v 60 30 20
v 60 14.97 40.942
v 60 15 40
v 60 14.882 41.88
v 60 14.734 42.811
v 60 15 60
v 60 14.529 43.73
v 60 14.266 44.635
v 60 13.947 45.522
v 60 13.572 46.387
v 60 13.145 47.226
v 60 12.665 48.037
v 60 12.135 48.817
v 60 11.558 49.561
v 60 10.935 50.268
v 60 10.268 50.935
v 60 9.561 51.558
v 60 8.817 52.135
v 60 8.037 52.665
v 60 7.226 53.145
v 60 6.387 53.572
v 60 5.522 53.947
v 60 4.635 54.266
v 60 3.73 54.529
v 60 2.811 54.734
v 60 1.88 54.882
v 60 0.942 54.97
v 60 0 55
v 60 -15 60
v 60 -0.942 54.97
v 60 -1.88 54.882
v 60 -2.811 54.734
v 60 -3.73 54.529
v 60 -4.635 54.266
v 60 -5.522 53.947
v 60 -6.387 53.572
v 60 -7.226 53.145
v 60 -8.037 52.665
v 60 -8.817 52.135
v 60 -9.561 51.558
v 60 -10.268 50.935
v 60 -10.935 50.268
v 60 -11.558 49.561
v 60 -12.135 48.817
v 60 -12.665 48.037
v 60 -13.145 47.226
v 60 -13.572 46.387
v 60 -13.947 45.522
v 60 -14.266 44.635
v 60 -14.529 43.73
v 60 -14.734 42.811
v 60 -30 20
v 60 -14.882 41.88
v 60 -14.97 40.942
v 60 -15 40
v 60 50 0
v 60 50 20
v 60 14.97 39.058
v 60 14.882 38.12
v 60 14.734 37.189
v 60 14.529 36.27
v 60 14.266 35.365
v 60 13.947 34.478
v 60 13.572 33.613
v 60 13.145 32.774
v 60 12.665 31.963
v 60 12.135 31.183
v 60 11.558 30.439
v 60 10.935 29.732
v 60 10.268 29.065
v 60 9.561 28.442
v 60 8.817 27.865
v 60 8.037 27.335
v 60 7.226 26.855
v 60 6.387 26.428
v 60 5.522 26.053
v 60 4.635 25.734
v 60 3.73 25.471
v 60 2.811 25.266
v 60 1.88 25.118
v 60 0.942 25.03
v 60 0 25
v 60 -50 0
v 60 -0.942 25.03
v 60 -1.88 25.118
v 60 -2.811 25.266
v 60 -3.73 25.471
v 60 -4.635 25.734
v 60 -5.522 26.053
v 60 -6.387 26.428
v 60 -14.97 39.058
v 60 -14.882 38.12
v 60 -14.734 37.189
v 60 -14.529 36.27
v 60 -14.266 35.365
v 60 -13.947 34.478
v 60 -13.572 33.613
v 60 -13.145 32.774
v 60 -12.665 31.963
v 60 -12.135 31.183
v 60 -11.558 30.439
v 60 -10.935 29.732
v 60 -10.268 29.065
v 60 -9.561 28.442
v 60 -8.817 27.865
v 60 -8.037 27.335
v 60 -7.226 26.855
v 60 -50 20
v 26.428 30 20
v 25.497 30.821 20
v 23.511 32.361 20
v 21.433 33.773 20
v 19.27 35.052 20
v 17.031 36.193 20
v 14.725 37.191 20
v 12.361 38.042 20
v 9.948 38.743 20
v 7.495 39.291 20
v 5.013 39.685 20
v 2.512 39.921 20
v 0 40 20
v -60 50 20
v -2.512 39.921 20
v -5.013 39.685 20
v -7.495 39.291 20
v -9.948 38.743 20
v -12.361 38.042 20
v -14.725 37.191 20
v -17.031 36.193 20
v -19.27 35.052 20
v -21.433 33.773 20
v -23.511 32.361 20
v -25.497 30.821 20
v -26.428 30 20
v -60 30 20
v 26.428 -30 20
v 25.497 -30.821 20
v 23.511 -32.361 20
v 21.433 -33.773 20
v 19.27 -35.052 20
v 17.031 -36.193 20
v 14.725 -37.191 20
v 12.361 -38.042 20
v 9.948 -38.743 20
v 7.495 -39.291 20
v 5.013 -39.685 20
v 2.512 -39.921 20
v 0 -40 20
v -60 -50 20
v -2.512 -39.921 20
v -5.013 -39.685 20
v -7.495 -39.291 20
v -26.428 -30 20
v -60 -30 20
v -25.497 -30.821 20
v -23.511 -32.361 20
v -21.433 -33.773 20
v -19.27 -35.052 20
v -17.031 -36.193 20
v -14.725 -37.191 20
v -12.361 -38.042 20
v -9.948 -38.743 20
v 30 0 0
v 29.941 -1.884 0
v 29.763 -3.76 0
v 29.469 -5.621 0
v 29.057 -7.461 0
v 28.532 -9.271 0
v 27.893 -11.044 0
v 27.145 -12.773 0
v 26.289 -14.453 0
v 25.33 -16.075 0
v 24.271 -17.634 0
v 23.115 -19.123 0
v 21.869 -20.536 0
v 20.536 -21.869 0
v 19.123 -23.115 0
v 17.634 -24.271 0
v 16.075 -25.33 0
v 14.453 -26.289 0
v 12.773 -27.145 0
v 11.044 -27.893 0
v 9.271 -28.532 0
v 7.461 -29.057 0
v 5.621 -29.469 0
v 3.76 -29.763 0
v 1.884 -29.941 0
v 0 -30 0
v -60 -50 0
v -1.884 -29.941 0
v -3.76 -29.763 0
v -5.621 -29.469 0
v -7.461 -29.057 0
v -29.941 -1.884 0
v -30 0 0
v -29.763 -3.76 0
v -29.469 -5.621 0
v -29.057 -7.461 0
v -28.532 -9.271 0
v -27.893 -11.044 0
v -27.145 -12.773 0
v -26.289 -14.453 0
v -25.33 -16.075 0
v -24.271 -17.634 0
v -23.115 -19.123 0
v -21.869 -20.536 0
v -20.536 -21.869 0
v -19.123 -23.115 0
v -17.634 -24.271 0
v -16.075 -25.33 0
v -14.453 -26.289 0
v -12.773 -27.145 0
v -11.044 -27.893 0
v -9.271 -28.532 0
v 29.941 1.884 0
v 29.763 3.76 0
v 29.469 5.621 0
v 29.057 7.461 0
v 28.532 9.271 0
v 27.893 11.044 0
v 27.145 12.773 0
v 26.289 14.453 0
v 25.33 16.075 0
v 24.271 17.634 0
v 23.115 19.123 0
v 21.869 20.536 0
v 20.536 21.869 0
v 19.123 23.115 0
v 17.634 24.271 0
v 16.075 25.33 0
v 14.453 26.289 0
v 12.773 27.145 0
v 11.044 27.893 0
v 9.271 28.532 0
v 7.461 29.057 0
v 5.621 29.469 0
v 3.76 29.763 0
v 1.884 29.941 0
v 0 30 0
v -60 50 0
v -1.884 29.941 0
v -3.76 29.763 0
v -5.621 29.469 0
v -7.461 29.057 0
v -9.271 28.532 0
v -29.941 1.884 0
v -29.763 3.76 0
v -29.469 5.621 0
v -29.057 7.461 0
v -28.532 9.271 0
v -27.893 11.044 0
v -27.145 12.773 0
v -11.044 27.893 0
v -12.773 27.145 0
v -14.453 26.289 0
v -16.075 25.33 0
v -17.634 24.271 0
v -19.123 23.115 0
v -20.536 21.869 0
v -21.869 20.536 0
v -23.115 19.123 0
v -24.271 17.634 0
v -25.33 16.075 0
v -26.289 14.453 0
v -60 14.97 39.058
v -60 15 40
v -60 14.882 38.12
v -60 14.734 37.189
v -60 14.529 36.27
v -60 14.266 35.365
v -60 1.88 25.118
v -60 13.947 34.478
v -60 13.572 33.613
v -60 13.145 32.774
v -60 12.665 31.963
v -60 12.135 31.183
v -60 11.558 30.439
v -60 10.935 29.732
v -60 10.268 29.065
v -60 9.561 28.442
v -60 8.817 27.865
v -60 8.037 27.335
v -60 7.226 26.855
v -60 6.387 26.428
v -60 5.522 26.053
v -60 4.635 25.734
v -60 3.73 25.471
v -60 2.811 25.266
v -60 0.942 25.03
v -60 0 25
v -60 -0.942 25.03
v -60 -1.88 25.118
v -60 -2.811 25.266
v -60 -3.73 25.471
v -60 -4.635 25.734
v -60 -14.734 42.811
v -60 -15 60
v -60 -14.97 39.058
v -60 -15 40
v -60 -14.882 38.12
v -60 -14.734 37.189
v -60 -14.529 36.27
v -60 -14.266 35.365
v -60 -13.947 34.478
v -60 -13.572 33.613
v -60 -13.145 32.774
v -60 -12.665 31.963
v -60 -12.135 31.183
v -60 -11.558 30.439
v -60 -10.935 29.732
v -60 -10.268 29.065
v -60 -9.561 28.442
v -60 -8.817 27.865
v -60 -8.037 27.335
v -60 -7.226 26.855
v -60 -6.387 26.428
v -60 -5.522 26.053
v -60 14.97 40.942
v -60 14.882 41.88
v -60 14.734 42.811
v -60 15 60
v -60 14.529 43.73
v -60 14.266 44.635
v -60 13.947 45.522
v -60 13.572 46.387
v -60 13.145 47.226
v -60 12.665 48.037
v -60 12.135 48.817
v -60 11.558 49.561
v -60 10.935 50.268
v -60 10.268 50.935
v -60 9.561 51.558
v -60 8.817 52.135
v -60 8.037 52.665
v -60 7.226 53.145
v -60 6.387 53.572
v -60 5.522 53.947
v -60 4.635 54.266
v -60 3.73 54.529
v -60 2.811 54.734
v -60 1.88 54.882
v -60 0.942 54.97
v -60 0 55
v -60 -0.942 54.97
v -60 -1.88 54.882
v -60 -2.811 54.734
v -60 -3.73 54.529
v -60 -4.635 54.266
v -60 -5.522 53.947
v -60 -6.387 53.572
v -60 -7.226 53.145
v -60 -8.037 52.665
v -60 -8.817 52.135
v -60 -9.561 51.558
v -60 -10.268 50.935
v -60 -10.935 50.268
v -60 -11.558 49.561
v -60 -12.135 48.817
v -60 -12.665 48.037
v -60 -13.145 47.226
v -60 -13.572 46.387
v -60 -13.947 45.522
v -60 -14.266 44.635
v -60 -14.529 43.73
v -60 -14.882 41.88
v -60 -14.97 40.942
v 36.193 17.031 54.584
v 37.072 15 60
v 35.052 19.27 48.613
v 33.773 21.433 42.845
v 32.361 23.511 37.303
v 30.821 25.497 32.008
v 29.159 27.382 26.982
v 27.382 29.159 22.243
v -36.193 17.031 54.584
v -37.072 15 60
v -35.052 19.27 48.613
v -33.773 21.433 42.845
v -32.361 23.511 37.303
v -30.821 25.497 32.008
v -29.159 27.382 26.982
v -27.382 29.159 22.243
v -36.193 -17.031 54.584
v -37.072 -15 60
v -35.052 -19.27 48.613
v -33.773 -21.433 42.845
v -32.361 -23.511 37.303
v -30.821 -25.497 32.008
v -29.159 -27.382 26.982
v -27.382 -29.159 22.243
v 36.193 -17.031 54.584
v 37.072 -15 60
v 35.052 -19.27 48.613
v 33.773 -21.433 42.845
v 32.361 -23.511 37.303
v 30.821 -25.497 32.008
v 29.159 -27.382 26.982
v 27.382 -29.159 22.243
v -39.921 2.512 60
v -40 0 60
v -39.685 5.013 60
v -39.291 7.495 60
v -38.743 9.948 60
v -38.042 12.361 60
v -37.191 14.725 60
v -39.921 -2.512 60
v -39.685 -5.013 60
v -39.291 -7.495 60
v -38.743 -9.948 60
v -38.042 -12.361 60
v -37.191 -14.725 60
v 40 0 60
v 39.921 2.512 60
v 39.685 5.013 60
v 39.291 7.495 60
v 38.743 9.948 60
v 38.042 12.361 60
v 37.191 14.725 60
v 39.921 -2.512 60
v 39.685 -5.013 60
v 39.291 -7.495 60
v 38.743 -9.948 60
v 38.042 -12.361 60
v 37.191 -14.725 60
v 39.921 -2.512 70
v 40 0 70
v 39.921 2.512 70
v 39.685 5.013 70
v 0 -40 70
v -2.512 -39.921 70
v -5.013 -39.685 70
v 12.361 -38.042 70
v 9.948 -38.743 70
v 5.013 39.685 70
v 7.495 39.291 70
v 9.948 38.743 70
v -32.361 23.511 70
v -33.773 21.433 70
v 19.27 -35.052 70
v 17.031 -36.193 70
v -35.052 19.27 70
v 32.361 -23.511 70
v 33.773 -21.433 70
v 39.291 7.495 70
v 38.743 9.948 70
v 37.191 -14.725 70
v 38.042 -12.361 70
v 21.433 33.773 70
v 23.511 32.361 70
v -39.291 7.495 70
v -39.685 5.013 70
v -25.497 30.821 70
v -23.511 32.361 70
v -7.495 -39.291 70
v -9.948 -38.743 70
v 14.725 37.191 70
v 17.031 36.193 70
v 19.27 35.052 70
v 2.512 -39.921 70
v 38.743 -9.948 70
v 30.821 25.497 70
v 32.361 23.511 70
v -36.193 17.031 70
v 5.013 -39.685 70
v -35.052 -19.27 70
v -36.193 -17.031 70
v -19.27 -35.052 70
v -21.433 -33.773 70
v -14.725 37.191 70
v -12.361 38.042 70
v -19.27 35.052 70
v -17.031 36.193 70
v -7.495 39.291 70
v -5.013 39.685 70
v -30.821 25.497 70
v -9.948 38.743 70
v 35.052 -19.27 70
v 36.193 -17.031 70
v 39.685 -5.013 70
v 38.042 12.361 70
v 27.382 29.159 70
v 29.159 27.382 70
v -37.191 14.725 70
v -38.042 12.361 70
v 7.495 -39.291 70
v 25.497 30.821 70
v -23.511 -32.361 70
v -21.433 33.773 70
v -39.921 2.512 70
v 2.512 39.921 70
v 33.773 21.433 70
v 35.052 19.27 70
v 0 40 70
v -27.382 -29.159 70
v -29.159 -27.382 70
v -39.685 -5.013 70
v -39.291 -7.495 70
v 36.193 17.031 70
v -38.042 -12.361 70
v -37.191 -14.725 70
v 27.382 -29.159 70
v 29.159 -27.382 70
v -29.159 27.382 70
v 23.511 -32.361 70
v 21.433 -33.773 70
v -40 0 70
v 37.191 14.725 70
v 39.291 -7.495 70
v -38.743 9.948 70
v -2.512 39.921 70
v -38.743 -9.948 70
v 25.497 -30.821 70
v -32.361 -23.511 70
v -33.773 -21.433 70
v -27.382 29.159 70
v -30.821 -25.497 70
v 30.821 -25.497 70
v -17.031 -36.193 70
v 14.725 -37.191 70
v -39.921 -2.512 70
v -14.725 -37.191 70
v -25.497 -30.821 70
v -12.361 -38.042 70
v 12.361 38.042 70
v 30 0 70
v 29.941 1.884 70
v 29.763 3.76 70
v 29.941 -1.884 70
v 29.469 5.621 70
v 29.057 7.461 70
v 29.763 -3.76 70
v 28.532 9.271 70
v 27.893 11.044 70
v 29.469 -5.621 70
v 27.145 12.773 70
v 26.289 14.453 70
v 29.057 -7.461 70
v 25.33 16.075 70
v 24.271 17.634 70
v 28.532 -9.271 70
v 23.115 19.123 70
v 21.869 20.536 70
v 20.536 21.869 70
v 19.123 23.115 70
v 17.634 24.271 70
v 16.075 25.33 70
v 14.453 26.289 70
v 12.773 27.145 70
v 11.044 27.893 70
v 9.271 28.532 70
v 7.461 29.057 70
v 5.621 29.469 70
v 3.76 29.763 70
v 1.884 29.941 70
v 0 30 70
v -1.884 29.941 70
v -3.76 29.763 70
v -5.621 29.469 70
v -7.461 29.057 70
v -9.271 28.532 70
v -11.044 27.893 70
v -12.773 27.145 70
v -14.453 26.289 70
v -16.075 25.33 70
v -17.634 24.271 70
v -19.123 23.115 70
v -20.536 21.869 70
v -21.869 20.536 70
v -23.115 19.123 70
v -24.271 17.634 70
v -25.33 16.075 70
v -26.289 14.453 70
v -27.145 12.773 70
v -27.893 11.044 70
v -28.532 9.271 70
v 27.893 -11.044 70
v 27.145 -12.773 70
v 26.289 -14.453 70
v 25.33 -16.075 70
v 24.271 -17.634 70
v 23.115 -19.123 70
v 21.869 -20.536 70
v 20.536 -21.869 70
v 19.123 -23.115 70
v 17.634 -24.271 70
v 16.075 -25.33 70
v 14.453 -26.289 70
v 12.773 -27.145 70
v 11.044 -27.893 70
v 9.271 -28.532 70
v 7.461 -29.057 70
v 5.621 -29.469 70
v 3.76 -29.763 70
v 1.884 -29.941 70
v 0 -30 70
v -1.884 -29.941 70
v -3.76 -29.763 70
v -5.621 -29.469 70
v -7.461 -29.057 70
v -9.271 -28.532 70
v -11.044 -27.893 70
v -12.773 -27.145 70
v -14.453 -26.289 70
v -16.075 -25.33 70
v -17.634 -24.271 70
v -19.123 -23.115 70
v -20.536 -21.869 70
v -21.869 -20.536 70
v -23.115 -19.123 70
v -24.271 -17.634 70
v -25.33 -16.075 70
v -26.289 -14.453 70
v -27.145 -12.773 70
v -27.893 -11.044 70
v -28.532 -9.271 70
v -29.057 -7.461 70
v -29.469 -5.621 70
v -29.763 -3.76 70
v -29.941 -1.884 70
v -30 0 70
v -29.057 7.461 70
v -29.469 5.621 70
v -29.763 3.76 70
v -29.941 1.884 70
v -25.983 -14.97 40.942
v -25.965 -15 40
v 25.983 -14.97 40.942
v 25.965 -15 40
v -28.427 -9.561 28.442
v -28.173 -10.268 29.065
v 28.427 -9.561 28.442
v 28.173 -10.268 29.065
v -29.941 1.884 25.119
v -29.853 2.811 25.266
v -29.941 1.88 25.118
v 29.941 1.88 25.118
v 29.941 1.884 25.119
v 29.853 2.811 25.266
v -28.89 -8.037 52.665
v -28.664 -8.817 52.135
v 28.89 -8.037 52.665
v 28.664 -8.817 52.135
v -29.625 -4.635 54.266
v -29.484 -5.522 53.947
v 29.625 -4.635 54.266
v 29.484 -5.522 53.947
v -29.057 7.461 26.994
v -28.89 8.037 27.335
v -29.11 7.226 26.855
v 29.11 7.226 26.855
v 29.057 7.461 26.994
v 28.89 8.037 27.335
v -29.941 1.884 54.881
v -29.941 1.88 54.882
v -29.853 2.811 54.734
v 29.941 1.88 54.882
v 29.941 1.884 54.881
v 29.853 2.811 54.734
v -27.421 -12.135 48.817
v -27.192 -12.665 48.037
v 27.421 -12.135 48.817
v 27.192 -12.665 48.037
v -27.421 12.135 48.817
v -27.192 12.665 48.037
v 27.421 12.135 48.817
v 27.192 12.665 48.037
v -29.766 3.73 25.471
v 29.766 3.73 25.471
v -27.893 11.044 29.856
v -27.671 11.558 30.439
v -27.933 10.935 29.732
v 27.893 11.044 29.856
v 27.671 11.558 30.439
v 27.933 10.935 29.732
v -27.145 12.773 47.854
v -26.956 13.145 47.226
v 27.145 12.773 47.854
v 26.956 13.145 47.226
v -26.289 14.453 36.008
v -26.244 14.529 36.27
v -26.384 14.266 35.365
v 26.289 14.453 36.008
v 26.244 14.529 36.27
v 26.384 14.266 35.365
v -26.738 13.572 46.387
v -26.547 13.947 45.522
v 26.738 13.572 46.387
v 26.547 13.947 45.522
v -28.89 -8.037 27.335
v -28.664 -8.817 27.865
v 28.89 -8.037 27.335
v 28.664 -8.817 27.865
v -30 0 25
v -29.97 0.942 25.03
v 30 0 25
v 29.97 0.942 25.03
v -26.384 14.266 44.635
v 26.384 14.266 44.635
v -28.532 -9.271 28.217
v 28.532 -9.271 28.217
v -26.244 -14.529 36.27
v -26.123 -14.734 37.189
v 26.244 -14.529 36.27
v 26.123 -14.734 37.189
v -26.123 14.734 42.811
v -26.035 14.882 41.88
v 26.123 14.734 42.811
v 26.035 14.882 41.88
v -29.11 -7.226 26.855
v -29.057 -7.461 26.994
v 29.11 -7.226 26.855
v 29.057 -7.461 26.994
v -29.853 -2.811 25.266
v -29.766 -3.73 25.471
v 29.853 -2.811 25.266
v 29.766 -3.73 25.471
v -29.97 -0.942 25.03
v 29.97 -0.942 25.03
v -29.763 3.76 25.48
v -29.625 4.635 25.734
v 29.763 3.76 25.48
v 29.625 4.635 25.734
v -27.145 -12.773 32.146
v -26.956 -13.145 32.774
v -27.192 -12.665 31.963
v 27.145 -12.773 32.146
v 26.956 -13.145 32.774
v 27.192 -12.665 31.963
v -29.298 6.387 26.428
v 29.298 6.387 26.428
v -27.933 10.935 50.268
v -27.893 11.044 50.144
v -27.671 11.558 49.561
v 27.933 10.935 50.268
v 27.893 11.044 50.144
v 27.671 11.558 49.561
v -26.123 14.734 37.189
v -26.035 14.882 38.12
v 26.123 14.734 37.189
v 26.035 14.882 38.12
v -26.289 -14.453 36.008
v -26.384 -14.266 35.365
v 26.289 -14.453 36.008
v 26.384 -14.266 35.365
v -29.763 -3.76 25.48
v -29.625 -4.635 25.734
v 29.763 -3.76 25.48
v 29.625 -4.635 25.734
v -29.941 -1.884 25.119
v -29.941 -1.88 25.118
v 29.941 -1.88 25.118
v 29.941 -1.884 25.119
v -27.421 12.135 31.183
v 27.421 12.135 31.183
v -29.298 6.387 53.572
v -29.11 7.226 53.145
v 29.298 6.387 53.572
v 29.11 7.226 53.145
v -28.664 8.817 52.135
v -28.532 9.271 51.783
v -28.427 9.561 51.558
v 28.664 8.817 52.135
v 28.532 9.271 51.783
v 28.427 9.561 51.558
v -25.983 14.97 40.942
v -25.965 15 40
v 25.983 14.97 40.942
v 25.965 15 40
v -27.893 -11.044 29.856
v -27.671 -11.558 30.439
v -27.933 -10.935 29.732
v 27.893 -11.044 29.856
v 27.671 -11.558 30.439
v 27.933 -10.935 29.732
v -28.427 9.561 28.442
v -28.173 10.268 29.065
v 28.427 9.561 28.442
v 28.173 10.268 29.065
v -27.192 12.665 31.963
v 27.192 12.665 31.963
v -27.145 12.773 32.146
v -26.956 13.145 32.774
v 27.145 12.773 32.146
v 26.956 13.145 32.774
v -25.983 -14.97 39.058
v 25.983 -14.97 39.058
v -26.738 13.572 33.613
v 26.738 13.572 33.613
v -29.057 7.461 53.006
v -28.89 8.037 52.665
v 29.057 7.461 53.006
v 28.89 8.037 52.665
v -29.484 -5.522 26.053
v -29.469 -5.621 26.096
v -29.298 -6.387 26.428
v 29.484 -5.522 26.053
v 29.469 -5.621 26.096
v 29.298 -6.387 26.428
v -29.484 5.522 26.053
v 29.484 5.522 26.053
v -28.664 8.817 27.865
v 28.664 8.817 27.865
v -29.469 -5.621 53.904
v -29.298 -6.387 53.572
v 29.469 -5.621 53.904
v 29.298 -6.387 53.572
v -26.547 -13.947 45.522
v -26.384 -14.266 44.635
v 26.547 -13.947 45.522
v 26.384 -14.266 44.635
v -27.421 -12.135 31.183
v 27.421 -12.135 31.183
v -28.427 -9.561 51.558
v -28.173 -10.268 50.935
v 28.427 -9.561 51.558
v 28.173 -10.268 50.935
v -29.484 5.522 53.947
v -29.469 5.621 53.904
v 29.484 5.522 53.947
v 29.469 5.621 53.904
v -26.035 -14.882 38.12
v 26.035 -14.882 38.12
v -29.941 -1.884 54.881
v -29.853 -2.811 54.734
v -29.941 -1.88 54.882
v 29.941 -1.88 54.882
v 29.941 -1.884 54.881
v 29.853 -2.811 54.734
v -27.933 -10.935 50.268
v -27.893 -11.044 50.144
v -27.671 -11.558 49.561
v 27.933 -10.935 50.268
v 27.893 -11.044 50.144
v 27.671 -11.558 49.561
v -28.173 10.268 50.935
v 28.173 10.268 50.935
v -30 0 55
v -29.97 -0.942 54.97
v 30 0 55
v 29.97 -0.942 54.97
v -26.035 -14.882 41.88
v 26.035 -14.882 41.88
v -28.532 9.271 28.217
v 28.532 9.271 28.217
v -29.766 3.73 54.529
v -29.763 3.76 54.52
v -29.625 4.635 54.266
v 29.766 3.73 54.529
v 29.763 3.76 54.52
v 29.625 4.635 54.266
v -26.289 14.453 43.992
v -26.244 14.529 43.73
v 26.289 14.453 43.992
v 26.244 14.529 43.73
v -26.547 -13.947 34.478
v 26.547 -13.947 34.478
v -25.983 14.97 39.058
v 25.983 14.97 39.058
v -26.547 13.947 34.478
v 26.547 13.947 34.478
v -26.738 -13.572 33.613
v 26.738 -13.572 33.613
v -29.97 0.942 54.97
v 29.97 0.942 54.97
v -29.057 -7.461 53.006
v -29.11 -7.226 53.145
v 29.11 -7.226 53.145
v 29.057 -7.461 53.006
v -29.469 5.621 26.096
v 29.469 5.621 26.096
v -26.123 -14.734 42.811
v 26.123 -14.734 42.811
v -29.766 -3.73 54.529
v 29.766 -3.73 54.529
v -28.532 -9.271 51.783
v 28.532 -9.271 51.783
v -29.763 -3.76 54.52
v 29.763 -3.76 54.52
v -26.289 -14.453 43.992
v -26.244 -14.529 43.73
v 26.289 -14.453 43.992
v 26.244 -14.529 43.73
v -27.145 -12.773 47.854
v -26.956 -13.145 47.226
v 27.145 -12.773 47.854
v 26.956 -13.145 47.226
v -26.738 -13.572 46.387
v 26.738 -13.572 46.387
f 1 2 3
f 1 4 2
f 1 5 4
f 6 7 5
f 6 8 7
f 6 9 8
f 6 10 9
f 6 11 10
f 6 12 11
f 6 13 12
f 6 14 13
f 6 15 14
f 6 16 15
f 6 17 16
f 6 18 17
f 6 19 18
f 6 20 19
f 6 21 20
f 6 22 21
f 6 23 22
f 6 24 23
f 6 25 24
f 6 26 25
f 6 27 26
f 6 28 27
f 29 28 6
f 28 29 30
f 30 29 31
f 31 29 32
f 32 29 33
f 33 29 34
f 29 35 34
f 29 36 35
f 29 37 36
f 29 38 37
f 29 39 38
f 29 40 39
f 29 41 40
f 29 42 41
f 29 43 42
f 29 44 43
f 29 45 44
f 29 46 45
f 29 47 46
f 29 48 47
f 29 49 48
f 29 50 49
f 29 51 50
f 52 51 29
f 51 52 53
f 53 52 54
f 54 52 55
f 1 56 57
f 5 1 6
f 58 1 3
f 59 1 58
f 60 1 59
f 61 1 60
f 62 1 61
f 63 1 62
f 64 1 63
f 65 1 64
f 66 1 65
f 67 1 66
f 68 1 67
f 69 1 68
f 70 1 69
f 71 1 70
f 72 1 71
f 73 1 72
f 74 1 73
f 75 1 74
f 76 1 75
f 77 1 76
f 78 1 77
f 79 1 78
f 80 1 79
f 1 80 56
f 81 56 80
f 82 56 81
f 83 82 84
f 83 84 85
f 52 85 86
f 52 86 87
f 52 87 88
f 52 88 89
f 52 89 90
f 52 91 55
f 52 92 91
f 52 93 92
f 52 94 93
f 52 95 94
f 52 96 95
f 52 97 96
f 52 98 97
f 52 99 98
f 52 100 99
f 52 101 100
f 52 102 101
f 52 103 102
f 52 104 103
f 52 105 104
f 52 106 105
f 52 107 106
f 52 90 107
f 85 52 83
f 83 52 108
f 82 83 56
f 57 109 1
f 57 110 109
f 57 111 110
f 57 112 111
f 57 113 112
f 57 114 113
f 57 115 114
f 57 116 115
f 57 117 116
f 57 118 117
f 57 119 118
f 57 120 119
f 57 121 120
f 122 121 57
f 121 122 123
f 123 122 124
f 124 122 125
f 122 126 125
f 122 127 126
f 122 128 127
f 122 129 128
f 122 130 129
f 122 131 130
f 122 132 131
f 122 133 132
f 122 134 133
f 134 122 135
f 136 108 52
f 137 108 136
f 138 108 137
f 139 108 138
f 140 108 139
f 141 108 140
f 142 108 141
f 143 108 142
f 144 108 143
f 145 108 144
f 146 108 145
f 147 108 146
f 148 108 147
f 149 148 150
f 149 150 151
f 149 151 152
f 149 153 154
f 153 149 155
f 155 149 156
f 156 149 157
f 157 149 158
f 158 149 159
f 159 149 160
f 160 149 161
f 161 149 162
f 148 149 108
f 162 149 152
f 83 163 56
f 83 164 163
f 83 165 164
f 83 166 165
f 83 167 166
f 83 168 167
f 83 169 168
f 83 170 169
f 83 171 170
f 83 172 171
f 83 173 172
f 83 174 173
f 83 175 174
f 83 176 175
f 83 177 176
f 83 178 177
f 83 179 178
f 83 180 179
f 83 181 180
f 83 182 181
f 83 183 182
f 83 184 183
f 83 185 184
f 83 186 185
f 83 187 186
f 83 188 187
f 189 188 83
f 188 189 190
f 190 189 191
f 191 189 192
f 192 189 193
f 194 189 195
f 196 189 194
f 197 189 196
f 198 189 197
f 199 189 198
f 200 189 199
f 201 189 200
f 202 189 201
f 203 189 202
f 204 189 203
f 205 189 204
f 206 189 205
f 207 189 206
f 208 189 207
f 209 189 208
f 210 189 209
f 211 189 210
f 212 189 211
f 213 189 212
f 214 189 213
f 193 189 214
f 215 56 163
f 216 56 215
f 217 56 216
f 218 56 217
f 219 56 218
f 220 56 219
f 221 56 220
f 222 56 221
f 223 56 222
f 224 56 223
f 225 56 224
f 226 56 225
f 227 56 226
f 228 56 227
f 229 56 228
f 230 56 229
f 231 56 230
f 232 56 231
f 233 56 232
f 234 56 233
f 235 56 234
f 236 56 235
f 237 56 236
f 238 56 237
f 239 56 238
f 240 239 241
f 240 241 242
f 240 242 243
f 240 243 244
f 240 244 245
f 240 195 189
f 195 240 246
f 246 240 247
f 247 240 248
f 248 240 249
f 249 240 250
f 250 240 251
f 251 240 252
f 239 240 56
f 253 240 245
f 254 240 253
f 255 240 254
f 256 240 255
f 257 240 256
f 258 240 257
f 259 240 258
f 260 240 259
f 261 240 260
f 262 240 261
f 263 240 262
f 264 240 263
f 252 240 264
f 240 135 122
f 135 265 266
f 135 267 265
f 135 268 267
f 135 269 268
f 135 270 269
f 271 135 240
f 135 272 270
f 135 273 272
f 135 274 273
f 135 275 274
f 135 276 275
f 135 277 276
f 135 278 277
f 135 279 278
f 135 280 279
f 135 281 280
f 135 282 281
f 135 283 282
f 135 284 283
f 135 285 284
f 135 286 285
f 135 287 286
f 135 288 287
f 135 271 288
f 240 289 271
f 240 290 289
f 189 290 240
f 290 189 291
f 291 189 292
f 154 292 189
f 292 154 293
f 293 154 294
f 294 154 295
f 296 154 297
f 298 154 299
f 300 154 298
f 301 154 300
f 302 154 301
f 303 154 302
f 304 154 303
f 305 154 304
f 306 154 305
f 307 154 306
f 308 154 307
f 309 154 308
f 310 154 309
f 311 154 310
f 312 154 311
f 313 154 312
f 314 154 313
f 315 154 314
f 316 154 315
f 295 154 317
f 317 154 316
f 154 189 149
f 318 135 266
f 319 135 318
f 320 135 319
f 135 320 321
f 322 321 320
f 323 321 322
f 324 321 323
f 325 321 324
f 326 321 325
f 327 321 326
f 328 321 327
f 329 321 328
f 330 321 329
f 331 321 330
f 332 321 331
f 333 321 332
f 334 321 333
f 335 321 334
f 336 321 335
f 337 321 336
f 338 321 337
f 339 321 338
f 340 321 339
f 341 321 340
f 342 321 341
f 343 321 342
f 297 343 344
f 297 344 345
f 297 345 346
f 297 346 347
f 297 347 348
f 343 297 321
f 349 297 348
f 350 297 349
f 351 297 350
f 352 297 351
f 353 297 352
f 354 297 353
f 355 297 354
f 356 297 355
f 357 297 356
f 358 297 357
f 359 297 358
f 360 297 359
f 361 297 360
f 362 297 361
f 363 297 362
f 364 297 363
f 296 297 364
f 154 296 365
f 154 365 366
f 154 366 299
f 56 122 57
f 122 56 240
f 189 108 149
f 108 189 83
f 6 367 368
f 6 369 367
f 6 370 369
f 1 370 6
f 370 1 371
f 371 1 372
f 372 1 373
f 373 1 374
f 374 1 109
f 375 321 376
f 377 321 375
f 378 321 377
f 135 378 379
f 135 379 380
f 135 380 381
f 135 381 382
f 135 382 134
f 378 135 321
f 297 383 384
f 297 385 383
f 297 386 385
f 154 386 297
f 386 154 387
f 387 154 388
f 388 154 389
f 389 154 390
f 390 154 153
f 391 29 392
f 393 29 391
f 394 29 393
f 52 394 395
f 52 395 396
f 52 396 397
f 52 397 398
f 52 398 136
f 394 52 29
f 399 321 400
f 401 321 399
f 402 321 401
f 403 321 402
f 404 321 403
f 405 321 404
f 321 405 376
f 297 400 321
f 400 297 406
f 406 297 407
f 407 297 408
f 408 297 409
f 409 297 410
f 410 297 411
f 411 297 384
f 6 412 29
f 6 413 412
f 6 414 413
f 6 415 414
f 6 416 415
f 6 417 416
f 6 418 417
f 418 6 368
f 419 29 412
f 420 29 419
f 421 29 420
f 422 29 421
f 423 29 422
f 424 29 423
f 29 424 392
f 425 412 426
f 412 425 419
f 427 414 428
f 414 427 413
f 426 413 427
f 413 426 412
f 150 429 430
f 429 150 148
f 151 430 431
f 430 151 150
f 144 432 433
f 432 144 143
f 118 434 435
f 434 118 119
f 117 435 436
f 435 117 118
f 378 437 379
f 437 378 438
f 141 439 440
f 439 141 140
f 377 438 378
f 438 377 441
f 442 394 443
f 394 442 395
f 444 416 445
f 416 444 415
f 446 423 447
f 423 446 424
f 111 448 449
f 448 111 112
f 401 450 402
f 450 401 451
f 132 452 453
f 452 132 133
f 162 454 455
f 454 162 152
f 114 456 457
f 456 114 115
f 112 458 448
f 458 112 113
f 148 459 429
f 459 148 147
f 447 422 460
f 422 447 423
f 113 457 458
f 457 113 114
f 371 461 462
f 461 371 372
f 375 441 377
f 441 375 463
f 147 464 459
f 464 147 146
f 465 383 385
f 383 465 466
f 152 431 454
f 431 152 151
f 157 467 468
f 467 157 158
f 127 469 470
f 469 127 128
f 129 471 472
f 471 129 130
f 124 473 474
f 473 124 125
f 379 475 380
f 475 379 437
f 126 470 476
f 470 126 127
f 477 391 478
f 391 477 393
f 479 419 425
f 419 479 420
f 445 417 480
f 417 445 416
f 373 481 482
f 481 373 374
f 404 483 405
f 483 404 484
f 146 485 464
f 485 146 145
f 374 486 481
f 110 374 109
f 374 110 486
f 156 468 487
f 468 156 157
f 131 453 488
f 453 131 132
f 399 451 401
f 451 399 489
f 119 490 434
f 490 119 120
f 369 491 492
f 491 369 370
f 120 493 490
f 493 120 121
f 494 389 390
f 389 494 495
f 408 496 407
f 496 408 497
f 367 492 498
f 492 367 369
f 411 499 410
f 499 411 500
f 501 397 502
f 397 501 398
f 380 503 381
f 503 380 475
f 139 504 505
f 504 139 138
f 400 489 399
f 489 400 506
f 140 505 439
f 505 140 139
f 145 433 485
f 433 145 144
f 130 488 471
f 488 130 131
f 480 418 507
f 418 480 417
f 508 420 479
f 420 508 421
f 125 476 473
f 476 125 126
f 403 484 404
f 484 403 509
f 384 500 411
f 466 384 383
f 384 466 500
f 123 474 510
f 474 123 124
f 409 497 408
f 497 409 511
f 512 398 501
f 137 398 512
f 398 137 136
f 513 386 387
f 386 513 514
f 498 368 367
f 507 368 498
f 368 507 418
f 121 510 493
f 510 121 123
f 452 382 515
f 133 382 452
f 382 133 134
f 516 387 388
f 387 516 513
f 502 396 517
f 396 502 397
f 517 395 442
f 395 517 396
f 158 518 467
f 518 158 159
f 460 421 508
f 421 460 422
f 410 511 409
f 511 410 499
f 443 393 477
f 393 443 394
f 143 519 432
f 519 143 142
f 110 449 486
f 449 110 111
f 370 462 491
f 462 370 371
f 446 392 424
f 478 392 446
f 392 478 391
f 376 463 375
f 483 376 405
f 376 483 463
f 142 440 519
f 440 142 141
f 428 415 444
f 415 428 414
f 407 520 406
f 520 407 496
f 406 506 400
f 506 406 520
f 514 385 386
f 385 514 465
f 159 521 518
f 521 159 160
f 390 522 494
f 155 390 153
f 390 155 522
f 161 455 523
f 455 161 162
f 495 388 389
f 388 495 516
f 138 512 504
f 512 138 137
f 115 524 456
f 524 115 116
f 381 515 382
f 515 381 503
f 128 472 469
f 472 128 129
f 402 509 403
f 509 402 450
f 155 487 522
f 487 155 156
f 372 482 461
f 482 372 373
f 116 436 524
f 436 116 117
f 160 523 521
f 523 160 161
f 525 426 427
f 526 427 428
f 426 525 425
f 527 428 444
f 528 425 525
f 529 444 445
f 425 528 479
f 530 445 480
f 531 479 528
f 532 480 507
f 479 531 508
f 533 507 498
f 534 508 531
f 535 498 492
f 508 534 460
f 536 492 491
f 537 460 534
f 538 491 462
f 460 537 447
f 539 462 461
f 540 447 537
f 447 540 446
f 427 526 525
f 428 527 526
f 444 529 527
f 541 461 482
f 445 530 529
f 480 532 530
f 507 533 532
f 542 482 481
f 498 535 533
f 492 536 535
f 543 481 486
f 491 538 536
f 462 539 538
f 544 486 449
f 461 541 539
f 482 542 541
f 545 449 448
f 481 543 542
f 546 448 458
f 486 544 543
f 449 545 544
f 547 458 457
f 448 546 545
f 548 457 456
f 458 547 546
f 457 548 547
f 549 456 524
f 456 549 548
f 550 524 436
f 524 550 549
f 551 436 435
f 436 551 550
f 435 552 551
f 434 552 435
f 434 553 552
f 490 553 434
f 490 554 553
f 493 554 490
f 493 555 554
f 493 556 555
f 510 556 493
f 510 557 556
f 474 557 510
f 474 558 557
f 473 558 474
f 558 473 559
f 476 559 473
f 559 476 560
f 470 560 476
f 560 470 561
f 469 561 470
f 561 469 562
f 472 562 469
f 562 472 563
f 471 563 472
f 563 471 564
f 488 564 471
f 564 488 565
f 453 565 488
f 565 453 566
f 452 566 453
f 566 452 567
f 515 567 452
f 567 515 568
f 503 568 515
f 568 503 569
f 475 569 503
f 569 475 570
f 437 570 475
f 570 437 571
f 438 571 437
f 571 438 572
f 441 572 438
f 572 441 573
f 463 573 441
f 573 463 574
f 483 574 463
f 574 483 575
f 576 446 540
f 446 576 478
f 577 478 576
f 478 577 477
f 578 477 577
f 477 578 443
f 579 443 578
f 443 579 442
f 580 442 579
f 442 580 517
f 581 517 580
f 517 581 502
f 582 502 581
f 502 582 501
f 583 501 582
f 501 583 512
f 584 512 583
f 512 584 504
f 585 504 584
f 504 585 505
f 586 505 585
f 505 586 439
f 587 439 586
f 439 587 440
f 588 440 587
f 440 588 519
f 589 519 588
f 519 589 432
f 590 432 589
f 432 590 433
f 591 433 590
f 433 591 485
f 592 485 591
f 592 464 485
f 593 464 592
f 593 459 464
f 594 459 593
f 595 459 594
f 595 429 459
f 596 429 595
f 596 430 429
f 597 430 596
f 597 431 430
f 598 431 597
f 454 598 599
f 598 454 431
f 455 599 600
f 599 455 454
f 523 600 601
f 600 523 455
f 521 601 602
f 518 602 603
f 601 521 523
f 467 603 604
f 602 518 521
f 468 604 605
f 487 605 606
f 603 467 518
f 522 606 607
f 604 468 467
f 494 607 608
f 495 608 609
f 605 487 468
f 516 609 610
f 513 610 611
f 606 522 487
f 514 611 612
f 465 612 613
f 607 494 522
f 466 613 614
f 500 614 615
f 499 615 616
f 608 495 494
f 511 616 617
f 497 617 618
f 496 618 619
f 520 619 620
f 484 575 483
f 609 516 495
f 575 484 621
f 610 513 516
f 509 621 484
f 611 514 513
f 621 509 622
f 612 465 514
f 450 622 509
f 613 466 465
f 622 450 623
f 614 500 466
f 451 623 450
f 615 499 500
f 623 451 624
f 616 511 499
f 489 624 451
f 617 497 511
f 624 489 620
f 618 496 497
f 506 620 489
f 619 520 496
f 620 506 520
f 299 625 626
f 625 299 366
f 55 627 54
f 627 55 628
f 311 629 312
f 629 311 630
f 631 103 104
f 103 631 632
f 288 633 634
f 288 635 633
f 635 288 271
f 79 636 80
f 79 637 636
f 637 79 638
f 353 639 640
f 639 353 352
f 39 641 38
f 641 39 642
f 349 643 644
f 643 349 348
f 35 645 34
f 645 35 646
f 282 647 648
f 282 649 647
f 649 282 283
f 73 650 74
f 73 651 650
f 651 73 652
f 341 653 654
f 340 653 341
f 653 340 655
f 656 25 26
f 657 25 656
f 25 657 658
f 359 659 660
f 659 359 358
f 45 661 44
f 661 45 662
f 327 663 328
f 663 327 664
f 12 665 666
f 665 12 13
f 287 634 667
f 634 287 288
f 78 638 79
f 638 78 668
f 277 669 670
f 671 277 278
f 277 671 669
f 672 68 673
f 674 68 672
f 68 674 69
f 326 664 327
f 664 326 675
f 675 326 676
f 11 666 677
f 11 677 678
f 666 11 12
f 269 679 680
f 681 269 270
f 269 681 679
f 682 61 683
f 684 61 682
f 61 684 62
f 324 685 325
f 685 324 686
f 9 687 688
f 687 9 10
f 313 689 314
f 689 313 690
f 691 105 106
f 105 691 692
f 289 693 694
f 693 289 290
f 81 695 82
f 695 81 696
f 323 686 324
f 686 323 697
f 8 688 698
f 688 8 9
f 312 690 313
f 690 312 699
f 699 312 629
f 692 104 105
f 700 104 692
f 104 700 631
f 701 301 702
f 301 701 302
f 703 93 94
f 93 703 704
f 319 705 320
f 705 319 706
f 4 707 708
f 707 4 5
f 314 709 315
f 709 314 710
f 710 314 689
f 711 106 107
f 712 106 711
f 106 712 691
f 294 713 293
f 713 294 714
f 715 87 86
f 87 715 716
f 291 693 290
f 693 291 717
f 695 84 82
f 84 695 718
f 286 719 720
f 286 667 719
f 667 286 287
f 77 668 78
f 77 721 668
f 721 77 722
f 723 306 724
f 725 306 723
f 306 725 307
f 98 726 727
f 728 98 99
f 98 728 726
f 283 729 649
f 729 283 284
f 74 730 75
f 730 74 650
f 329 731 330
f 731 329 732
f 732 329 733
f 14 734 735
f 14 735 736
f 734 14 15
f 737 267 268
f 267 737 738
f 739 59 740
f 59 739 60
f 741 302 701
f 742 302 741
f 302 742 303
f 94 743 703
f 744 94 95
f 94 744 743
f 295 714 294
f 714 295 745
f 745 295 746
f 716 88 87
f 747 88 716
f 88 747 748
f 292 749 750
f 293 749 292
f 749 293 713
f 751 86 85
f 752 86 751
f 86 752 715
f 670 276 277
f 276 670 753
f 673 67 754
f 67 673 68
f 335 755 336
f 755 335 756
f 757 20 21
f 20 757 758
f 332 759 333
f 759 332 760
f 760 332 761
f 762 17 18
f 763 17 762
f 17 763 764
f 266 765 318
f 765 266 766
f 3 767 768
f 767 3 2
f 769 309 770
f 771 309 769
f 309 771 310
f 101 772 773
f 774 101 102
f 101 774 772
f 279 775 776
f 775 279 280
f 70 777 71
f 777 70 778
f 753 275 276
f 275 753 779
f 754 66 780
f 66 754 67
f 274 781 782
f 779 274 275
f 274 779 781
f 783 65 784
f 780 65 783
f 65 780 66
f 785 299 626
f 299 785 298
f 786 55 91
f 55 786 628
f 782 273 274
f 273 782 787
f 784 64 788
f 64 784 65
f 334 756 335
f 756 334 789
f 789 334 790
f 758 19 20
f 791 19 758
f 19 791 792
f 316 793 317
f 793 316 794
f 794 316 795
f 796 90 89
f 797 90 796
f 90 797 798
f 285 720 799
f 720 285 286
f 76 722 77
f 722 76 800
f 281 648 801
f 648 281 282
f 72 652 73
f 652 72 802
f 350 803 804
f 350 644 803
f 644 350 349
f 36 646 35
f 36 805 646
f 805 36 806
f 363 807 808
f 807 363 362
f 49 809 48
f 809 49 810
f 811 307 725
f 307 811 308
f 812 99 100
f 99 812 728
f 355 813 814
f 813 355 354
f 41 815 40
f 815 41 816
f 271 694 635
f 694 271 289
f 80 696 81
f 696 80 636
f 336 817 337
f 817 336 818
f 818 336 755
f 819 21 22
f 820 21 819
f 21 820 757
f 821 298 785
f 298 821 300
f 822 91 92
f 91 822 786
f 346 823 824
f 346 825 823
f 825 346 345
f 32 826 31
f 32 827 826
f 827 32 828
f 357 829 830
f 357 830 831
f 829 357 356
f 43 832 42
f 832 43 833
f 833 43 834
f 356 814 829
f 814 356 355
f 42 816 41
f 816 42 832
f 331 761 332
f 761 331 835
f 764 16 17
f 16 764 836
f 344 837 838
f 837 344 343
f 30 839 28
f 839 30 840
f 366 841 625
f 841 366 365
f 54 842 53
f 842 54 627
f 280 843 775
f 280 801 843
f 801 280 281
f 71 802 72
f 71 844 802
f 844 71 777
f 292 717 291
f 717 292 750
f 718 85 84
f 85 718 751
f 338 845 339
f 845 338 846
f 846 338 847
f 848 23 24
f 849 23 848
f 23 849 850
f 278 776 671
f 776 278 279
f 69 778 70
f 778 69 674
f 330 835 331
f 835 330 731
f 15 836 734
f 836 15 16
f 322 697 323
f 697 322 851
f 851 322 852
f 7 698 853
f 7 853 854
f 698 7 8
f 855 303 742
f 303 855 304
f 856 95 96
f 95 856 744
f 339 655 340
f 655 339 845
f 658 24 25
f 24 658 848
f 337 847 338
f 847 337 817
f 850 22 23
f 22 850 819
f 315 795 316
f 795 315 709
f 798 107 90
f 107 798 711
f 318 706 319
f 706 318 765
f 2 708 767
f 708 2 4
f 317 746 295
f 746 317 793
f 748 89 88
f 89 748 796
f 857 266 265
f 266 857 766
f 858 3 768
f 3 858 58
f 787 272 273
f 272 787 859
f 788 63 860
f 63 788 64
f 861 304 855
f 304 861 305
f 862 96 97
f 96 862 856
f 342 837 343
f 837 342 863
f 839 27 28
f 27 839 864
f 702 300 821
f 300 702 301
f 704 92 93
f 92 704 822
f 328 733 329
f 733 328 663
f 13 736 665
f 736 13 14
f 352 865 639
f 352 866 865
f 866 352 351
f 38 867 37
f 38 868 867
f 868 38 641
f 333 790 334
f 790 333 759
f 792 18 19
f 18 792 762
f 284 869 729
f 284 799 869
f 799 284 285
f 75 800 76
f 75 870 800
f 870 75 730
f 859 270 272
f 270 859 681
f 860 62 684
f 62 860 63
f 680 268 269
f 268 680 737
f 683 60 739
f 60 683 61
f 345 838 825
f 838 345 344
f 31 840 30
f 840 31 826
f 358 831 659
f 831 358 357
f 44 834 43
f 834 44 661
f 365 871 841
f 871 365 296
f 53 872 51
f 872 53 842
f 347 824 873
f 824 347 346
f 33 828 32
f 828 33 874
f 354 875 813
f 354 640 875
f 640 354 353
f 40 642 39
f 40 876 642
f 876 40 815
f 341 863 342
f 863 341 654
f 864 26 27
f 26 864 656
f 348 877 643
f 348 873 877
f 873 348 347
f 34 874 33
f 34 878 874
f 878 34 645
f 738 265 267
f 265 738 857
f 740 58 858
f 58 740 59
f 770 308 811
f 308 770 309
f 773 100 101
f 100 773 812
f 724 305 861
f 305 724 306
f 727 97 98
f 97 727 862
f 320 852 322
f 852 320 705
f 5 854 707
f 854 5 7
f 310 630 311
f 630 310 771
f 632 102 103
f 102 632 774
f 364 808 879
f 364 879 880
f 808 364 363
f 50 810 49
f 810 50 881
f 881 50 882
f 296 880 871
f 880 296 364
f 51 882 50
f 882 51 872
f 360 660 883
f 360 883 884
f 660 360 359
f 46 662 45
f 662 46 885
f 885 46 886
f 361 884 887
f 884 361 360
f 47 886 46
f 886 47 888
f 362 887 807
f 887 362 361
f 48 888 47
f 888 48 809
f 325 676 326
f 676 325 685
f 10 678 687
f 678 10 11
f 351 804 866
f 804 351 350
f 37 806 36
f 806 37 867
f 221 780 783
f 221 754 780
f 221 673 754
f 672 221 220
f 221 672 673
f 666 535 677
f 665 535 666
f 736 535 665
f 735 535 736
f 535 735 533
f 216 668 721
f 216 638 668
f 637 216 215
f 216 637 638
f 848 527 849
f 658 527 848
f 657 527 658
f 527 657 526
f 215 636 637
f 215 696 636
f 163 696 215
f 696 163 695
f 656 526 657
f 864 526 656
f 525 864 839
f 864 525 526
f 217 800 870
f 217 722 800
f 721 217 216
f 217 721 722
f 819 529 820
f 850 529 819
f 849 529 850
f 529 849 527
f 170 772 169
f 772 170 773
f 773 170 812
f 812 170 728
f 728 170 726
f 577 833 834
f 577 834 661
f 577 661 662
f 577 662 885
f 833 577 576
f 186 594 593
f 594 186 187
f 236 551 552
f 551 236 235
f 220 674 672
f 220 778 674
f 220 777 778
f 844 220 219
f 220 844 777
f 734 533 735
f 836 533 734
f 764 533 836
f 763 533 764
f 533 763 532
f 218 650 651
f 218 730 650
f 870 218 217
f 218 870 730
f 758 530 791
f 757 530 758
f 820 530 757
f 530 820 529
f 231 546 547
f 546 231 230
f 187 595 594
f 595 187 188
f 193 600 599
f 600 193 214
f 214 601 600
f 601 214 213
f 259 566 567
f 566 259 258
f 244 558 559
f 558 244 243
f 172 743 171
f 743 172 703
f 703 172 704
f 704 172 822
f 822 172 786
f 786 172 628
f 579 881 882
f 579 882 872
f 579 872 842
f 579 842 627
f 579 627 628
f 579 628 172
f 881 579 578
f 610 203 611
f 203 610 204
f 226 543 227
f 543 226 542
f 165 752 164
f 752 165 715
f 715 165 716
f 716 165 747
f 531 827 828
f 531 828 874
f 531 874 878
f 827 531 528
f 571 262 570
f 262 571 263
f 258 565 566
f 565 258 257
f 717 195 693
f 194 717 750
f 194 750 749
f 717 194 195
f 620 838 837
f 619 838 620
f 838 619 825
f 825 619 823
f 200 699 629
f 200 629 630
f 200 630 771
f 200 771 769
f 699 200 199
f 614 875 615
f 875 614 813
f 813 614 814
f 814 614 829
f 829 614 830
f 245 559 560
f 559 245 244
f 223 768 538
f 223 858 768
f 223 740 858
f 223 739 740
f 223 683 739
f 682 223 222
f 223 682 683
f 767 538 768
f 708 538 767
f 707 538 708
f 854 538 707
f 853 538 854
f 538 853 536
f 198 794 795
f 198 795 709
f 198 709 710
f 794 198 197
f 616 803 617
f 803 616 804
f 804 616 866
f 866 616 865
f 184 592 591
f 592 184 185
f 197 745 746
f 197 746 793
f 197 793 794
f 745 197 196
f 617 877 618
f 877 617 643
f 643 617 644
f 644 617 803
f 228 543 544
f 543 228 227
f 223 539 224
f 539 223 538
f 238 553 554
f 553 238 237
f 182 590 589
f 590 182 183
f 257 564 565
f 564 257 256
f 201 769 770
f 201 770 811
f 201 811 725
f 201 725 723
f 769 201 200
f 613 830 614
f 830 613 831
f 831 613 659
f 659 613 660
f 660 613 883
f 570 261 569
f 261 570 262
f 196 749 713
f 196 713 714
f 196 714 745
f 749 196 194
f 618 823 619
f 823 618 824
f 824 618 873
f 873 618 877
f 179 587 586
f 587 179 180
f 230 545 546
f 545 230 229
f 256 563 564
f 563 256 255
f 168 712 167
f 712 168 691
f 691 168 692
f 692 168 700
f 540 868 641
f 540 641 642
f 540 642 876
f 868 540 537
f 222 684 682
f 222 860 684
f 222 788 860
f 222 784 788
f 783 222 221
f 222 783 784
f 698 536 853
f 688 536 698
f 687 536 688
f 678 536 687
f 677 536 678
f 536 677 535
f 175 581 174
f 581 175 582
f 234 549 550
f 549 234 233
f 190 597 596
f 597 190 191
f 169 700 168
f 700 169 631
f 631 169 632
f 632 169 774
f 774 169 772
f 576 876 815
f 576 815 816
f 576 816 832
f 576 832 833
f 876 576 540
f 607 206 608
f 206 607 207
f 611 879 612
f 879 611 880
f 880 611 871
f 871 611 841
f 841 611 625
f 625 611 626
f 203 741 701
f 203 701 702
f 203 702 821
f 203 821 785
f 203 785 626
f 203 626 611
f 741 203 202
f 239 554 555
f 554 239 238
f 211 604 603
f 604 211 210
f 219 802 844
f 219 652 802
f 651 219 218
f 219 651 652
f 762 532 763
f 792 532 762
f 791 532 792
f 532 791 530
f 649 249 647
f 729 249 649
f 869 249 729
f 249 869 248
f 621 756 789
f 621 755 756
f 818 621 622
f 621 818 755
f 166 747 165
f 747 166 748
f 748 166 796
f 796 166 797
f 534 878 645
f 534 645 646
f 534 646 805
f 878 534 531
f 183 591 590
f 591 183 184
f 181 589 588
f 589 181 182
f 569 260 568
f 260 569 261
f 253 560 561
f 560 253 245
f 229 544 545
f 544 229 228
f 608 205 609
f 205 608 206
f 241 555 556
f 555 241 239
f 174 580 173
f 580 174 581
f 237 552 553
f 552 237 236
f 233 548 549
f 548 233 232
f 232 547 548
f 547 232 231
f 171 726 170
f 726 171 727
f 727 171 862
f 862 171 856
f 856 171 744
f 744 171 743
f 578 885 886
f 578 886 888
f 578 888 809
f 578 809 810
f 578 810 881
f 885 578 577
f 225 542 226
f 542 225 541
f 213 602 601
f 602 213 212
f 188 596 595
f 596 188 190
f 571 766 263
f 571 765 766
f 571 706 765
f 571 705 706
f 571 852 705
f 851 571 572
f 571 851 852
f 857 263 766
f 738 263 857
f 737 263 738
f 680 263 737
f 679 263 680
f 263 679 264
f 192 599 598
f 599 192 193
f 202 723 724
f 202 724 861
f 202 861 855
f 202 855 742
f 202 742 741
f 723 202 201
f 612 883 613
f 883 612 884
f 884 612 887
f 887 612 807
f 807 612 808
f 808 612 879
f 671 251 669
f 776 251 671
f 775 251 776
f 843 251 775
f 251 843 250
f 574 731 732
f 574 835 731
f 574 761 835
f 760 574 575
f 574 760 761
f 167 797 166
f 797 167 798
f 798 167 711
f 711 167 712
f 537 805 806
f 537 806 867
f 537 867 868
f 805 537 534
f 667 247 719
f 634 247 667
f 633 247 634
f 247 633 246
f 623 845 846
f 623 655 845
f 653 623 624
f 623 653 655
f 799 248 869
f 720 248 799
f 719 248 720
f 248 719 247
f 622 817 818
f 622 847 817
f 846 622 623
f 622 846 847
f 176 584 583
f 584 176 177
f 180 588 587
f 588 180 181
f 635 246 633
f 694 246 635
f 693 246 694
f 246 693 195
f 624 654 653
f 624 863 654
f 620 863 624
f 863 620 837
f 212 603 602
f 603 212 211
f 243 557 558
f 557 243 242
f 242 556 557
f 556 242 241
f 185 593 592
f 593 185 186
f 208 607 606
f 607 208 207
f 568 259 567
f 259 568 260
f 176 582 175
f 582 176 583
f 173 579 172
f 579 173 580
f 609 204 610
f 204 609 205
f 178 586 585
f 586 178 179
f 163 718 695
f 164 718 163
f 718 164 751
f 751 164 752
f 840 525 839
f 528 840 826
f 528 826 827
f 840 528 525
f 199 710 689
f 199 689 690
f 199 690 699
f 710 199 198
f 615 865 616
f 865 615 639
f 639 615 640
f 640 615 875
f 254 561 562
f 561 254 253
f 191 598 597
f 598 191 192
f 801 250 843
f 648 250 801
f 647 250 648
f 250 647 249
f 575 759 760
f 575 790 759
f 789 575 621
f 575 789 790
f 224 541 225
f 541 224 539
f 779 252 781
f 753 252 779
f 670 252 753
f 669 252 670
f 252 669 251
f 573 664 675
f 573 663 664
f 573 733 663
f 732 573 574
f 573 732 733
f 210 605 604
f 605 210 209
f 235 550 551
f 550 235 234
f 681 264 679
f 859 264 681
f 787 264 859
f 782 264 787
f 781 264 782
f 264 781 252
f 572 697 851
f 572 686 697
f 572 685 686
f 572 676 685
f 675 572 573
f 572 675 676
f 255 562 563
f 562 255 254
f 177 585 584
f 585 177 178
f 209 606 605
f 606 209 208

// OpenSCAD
difference(){
    union(){
        // ПРЯМОУГОЛЬНОЕ ОСНОВАНИЕ
       color("gray") translate([0,0,10]) cube([120, 100, 20], center=true);


        // ТРАПЕЦИЯ
        bottom_width = 60;
        top_width = 30;
        height = 40;
        depth = 120;

        color("gray")
        translate([0, 0, 20])
            rotate([90, 0, 90])  
                linear_extrude(height=depth, center=true)
                    polygon(points=[[-bottom_width/2, 0],
                    [ bottom_width/2, 0],
                    [ top_width/2, height],
                    [-top_width/2, height]
                    ]);
        // ЦИЛИНДР
        translate([0, 0, 20]) color("gray") cylinder(h = 50, d = 80, $fn = 100);
    }
    
    // Смотровое отверстие с обеих сторон
    color("gray") 
    translate([-75, 0, 40]) 
        rotate([0, 90, 0])  
            cylinder(h=150, d=30, $fn = 100);
    
    // ОТВЕРСТИЕ В СЕРДЦЕ, ВИД СВЕРХУ
    translate([0, 0, -20])
        color("gray") 
            cylinder(h = 100, d = 60, $fn = 100); 
    
}



// color("cyan")
